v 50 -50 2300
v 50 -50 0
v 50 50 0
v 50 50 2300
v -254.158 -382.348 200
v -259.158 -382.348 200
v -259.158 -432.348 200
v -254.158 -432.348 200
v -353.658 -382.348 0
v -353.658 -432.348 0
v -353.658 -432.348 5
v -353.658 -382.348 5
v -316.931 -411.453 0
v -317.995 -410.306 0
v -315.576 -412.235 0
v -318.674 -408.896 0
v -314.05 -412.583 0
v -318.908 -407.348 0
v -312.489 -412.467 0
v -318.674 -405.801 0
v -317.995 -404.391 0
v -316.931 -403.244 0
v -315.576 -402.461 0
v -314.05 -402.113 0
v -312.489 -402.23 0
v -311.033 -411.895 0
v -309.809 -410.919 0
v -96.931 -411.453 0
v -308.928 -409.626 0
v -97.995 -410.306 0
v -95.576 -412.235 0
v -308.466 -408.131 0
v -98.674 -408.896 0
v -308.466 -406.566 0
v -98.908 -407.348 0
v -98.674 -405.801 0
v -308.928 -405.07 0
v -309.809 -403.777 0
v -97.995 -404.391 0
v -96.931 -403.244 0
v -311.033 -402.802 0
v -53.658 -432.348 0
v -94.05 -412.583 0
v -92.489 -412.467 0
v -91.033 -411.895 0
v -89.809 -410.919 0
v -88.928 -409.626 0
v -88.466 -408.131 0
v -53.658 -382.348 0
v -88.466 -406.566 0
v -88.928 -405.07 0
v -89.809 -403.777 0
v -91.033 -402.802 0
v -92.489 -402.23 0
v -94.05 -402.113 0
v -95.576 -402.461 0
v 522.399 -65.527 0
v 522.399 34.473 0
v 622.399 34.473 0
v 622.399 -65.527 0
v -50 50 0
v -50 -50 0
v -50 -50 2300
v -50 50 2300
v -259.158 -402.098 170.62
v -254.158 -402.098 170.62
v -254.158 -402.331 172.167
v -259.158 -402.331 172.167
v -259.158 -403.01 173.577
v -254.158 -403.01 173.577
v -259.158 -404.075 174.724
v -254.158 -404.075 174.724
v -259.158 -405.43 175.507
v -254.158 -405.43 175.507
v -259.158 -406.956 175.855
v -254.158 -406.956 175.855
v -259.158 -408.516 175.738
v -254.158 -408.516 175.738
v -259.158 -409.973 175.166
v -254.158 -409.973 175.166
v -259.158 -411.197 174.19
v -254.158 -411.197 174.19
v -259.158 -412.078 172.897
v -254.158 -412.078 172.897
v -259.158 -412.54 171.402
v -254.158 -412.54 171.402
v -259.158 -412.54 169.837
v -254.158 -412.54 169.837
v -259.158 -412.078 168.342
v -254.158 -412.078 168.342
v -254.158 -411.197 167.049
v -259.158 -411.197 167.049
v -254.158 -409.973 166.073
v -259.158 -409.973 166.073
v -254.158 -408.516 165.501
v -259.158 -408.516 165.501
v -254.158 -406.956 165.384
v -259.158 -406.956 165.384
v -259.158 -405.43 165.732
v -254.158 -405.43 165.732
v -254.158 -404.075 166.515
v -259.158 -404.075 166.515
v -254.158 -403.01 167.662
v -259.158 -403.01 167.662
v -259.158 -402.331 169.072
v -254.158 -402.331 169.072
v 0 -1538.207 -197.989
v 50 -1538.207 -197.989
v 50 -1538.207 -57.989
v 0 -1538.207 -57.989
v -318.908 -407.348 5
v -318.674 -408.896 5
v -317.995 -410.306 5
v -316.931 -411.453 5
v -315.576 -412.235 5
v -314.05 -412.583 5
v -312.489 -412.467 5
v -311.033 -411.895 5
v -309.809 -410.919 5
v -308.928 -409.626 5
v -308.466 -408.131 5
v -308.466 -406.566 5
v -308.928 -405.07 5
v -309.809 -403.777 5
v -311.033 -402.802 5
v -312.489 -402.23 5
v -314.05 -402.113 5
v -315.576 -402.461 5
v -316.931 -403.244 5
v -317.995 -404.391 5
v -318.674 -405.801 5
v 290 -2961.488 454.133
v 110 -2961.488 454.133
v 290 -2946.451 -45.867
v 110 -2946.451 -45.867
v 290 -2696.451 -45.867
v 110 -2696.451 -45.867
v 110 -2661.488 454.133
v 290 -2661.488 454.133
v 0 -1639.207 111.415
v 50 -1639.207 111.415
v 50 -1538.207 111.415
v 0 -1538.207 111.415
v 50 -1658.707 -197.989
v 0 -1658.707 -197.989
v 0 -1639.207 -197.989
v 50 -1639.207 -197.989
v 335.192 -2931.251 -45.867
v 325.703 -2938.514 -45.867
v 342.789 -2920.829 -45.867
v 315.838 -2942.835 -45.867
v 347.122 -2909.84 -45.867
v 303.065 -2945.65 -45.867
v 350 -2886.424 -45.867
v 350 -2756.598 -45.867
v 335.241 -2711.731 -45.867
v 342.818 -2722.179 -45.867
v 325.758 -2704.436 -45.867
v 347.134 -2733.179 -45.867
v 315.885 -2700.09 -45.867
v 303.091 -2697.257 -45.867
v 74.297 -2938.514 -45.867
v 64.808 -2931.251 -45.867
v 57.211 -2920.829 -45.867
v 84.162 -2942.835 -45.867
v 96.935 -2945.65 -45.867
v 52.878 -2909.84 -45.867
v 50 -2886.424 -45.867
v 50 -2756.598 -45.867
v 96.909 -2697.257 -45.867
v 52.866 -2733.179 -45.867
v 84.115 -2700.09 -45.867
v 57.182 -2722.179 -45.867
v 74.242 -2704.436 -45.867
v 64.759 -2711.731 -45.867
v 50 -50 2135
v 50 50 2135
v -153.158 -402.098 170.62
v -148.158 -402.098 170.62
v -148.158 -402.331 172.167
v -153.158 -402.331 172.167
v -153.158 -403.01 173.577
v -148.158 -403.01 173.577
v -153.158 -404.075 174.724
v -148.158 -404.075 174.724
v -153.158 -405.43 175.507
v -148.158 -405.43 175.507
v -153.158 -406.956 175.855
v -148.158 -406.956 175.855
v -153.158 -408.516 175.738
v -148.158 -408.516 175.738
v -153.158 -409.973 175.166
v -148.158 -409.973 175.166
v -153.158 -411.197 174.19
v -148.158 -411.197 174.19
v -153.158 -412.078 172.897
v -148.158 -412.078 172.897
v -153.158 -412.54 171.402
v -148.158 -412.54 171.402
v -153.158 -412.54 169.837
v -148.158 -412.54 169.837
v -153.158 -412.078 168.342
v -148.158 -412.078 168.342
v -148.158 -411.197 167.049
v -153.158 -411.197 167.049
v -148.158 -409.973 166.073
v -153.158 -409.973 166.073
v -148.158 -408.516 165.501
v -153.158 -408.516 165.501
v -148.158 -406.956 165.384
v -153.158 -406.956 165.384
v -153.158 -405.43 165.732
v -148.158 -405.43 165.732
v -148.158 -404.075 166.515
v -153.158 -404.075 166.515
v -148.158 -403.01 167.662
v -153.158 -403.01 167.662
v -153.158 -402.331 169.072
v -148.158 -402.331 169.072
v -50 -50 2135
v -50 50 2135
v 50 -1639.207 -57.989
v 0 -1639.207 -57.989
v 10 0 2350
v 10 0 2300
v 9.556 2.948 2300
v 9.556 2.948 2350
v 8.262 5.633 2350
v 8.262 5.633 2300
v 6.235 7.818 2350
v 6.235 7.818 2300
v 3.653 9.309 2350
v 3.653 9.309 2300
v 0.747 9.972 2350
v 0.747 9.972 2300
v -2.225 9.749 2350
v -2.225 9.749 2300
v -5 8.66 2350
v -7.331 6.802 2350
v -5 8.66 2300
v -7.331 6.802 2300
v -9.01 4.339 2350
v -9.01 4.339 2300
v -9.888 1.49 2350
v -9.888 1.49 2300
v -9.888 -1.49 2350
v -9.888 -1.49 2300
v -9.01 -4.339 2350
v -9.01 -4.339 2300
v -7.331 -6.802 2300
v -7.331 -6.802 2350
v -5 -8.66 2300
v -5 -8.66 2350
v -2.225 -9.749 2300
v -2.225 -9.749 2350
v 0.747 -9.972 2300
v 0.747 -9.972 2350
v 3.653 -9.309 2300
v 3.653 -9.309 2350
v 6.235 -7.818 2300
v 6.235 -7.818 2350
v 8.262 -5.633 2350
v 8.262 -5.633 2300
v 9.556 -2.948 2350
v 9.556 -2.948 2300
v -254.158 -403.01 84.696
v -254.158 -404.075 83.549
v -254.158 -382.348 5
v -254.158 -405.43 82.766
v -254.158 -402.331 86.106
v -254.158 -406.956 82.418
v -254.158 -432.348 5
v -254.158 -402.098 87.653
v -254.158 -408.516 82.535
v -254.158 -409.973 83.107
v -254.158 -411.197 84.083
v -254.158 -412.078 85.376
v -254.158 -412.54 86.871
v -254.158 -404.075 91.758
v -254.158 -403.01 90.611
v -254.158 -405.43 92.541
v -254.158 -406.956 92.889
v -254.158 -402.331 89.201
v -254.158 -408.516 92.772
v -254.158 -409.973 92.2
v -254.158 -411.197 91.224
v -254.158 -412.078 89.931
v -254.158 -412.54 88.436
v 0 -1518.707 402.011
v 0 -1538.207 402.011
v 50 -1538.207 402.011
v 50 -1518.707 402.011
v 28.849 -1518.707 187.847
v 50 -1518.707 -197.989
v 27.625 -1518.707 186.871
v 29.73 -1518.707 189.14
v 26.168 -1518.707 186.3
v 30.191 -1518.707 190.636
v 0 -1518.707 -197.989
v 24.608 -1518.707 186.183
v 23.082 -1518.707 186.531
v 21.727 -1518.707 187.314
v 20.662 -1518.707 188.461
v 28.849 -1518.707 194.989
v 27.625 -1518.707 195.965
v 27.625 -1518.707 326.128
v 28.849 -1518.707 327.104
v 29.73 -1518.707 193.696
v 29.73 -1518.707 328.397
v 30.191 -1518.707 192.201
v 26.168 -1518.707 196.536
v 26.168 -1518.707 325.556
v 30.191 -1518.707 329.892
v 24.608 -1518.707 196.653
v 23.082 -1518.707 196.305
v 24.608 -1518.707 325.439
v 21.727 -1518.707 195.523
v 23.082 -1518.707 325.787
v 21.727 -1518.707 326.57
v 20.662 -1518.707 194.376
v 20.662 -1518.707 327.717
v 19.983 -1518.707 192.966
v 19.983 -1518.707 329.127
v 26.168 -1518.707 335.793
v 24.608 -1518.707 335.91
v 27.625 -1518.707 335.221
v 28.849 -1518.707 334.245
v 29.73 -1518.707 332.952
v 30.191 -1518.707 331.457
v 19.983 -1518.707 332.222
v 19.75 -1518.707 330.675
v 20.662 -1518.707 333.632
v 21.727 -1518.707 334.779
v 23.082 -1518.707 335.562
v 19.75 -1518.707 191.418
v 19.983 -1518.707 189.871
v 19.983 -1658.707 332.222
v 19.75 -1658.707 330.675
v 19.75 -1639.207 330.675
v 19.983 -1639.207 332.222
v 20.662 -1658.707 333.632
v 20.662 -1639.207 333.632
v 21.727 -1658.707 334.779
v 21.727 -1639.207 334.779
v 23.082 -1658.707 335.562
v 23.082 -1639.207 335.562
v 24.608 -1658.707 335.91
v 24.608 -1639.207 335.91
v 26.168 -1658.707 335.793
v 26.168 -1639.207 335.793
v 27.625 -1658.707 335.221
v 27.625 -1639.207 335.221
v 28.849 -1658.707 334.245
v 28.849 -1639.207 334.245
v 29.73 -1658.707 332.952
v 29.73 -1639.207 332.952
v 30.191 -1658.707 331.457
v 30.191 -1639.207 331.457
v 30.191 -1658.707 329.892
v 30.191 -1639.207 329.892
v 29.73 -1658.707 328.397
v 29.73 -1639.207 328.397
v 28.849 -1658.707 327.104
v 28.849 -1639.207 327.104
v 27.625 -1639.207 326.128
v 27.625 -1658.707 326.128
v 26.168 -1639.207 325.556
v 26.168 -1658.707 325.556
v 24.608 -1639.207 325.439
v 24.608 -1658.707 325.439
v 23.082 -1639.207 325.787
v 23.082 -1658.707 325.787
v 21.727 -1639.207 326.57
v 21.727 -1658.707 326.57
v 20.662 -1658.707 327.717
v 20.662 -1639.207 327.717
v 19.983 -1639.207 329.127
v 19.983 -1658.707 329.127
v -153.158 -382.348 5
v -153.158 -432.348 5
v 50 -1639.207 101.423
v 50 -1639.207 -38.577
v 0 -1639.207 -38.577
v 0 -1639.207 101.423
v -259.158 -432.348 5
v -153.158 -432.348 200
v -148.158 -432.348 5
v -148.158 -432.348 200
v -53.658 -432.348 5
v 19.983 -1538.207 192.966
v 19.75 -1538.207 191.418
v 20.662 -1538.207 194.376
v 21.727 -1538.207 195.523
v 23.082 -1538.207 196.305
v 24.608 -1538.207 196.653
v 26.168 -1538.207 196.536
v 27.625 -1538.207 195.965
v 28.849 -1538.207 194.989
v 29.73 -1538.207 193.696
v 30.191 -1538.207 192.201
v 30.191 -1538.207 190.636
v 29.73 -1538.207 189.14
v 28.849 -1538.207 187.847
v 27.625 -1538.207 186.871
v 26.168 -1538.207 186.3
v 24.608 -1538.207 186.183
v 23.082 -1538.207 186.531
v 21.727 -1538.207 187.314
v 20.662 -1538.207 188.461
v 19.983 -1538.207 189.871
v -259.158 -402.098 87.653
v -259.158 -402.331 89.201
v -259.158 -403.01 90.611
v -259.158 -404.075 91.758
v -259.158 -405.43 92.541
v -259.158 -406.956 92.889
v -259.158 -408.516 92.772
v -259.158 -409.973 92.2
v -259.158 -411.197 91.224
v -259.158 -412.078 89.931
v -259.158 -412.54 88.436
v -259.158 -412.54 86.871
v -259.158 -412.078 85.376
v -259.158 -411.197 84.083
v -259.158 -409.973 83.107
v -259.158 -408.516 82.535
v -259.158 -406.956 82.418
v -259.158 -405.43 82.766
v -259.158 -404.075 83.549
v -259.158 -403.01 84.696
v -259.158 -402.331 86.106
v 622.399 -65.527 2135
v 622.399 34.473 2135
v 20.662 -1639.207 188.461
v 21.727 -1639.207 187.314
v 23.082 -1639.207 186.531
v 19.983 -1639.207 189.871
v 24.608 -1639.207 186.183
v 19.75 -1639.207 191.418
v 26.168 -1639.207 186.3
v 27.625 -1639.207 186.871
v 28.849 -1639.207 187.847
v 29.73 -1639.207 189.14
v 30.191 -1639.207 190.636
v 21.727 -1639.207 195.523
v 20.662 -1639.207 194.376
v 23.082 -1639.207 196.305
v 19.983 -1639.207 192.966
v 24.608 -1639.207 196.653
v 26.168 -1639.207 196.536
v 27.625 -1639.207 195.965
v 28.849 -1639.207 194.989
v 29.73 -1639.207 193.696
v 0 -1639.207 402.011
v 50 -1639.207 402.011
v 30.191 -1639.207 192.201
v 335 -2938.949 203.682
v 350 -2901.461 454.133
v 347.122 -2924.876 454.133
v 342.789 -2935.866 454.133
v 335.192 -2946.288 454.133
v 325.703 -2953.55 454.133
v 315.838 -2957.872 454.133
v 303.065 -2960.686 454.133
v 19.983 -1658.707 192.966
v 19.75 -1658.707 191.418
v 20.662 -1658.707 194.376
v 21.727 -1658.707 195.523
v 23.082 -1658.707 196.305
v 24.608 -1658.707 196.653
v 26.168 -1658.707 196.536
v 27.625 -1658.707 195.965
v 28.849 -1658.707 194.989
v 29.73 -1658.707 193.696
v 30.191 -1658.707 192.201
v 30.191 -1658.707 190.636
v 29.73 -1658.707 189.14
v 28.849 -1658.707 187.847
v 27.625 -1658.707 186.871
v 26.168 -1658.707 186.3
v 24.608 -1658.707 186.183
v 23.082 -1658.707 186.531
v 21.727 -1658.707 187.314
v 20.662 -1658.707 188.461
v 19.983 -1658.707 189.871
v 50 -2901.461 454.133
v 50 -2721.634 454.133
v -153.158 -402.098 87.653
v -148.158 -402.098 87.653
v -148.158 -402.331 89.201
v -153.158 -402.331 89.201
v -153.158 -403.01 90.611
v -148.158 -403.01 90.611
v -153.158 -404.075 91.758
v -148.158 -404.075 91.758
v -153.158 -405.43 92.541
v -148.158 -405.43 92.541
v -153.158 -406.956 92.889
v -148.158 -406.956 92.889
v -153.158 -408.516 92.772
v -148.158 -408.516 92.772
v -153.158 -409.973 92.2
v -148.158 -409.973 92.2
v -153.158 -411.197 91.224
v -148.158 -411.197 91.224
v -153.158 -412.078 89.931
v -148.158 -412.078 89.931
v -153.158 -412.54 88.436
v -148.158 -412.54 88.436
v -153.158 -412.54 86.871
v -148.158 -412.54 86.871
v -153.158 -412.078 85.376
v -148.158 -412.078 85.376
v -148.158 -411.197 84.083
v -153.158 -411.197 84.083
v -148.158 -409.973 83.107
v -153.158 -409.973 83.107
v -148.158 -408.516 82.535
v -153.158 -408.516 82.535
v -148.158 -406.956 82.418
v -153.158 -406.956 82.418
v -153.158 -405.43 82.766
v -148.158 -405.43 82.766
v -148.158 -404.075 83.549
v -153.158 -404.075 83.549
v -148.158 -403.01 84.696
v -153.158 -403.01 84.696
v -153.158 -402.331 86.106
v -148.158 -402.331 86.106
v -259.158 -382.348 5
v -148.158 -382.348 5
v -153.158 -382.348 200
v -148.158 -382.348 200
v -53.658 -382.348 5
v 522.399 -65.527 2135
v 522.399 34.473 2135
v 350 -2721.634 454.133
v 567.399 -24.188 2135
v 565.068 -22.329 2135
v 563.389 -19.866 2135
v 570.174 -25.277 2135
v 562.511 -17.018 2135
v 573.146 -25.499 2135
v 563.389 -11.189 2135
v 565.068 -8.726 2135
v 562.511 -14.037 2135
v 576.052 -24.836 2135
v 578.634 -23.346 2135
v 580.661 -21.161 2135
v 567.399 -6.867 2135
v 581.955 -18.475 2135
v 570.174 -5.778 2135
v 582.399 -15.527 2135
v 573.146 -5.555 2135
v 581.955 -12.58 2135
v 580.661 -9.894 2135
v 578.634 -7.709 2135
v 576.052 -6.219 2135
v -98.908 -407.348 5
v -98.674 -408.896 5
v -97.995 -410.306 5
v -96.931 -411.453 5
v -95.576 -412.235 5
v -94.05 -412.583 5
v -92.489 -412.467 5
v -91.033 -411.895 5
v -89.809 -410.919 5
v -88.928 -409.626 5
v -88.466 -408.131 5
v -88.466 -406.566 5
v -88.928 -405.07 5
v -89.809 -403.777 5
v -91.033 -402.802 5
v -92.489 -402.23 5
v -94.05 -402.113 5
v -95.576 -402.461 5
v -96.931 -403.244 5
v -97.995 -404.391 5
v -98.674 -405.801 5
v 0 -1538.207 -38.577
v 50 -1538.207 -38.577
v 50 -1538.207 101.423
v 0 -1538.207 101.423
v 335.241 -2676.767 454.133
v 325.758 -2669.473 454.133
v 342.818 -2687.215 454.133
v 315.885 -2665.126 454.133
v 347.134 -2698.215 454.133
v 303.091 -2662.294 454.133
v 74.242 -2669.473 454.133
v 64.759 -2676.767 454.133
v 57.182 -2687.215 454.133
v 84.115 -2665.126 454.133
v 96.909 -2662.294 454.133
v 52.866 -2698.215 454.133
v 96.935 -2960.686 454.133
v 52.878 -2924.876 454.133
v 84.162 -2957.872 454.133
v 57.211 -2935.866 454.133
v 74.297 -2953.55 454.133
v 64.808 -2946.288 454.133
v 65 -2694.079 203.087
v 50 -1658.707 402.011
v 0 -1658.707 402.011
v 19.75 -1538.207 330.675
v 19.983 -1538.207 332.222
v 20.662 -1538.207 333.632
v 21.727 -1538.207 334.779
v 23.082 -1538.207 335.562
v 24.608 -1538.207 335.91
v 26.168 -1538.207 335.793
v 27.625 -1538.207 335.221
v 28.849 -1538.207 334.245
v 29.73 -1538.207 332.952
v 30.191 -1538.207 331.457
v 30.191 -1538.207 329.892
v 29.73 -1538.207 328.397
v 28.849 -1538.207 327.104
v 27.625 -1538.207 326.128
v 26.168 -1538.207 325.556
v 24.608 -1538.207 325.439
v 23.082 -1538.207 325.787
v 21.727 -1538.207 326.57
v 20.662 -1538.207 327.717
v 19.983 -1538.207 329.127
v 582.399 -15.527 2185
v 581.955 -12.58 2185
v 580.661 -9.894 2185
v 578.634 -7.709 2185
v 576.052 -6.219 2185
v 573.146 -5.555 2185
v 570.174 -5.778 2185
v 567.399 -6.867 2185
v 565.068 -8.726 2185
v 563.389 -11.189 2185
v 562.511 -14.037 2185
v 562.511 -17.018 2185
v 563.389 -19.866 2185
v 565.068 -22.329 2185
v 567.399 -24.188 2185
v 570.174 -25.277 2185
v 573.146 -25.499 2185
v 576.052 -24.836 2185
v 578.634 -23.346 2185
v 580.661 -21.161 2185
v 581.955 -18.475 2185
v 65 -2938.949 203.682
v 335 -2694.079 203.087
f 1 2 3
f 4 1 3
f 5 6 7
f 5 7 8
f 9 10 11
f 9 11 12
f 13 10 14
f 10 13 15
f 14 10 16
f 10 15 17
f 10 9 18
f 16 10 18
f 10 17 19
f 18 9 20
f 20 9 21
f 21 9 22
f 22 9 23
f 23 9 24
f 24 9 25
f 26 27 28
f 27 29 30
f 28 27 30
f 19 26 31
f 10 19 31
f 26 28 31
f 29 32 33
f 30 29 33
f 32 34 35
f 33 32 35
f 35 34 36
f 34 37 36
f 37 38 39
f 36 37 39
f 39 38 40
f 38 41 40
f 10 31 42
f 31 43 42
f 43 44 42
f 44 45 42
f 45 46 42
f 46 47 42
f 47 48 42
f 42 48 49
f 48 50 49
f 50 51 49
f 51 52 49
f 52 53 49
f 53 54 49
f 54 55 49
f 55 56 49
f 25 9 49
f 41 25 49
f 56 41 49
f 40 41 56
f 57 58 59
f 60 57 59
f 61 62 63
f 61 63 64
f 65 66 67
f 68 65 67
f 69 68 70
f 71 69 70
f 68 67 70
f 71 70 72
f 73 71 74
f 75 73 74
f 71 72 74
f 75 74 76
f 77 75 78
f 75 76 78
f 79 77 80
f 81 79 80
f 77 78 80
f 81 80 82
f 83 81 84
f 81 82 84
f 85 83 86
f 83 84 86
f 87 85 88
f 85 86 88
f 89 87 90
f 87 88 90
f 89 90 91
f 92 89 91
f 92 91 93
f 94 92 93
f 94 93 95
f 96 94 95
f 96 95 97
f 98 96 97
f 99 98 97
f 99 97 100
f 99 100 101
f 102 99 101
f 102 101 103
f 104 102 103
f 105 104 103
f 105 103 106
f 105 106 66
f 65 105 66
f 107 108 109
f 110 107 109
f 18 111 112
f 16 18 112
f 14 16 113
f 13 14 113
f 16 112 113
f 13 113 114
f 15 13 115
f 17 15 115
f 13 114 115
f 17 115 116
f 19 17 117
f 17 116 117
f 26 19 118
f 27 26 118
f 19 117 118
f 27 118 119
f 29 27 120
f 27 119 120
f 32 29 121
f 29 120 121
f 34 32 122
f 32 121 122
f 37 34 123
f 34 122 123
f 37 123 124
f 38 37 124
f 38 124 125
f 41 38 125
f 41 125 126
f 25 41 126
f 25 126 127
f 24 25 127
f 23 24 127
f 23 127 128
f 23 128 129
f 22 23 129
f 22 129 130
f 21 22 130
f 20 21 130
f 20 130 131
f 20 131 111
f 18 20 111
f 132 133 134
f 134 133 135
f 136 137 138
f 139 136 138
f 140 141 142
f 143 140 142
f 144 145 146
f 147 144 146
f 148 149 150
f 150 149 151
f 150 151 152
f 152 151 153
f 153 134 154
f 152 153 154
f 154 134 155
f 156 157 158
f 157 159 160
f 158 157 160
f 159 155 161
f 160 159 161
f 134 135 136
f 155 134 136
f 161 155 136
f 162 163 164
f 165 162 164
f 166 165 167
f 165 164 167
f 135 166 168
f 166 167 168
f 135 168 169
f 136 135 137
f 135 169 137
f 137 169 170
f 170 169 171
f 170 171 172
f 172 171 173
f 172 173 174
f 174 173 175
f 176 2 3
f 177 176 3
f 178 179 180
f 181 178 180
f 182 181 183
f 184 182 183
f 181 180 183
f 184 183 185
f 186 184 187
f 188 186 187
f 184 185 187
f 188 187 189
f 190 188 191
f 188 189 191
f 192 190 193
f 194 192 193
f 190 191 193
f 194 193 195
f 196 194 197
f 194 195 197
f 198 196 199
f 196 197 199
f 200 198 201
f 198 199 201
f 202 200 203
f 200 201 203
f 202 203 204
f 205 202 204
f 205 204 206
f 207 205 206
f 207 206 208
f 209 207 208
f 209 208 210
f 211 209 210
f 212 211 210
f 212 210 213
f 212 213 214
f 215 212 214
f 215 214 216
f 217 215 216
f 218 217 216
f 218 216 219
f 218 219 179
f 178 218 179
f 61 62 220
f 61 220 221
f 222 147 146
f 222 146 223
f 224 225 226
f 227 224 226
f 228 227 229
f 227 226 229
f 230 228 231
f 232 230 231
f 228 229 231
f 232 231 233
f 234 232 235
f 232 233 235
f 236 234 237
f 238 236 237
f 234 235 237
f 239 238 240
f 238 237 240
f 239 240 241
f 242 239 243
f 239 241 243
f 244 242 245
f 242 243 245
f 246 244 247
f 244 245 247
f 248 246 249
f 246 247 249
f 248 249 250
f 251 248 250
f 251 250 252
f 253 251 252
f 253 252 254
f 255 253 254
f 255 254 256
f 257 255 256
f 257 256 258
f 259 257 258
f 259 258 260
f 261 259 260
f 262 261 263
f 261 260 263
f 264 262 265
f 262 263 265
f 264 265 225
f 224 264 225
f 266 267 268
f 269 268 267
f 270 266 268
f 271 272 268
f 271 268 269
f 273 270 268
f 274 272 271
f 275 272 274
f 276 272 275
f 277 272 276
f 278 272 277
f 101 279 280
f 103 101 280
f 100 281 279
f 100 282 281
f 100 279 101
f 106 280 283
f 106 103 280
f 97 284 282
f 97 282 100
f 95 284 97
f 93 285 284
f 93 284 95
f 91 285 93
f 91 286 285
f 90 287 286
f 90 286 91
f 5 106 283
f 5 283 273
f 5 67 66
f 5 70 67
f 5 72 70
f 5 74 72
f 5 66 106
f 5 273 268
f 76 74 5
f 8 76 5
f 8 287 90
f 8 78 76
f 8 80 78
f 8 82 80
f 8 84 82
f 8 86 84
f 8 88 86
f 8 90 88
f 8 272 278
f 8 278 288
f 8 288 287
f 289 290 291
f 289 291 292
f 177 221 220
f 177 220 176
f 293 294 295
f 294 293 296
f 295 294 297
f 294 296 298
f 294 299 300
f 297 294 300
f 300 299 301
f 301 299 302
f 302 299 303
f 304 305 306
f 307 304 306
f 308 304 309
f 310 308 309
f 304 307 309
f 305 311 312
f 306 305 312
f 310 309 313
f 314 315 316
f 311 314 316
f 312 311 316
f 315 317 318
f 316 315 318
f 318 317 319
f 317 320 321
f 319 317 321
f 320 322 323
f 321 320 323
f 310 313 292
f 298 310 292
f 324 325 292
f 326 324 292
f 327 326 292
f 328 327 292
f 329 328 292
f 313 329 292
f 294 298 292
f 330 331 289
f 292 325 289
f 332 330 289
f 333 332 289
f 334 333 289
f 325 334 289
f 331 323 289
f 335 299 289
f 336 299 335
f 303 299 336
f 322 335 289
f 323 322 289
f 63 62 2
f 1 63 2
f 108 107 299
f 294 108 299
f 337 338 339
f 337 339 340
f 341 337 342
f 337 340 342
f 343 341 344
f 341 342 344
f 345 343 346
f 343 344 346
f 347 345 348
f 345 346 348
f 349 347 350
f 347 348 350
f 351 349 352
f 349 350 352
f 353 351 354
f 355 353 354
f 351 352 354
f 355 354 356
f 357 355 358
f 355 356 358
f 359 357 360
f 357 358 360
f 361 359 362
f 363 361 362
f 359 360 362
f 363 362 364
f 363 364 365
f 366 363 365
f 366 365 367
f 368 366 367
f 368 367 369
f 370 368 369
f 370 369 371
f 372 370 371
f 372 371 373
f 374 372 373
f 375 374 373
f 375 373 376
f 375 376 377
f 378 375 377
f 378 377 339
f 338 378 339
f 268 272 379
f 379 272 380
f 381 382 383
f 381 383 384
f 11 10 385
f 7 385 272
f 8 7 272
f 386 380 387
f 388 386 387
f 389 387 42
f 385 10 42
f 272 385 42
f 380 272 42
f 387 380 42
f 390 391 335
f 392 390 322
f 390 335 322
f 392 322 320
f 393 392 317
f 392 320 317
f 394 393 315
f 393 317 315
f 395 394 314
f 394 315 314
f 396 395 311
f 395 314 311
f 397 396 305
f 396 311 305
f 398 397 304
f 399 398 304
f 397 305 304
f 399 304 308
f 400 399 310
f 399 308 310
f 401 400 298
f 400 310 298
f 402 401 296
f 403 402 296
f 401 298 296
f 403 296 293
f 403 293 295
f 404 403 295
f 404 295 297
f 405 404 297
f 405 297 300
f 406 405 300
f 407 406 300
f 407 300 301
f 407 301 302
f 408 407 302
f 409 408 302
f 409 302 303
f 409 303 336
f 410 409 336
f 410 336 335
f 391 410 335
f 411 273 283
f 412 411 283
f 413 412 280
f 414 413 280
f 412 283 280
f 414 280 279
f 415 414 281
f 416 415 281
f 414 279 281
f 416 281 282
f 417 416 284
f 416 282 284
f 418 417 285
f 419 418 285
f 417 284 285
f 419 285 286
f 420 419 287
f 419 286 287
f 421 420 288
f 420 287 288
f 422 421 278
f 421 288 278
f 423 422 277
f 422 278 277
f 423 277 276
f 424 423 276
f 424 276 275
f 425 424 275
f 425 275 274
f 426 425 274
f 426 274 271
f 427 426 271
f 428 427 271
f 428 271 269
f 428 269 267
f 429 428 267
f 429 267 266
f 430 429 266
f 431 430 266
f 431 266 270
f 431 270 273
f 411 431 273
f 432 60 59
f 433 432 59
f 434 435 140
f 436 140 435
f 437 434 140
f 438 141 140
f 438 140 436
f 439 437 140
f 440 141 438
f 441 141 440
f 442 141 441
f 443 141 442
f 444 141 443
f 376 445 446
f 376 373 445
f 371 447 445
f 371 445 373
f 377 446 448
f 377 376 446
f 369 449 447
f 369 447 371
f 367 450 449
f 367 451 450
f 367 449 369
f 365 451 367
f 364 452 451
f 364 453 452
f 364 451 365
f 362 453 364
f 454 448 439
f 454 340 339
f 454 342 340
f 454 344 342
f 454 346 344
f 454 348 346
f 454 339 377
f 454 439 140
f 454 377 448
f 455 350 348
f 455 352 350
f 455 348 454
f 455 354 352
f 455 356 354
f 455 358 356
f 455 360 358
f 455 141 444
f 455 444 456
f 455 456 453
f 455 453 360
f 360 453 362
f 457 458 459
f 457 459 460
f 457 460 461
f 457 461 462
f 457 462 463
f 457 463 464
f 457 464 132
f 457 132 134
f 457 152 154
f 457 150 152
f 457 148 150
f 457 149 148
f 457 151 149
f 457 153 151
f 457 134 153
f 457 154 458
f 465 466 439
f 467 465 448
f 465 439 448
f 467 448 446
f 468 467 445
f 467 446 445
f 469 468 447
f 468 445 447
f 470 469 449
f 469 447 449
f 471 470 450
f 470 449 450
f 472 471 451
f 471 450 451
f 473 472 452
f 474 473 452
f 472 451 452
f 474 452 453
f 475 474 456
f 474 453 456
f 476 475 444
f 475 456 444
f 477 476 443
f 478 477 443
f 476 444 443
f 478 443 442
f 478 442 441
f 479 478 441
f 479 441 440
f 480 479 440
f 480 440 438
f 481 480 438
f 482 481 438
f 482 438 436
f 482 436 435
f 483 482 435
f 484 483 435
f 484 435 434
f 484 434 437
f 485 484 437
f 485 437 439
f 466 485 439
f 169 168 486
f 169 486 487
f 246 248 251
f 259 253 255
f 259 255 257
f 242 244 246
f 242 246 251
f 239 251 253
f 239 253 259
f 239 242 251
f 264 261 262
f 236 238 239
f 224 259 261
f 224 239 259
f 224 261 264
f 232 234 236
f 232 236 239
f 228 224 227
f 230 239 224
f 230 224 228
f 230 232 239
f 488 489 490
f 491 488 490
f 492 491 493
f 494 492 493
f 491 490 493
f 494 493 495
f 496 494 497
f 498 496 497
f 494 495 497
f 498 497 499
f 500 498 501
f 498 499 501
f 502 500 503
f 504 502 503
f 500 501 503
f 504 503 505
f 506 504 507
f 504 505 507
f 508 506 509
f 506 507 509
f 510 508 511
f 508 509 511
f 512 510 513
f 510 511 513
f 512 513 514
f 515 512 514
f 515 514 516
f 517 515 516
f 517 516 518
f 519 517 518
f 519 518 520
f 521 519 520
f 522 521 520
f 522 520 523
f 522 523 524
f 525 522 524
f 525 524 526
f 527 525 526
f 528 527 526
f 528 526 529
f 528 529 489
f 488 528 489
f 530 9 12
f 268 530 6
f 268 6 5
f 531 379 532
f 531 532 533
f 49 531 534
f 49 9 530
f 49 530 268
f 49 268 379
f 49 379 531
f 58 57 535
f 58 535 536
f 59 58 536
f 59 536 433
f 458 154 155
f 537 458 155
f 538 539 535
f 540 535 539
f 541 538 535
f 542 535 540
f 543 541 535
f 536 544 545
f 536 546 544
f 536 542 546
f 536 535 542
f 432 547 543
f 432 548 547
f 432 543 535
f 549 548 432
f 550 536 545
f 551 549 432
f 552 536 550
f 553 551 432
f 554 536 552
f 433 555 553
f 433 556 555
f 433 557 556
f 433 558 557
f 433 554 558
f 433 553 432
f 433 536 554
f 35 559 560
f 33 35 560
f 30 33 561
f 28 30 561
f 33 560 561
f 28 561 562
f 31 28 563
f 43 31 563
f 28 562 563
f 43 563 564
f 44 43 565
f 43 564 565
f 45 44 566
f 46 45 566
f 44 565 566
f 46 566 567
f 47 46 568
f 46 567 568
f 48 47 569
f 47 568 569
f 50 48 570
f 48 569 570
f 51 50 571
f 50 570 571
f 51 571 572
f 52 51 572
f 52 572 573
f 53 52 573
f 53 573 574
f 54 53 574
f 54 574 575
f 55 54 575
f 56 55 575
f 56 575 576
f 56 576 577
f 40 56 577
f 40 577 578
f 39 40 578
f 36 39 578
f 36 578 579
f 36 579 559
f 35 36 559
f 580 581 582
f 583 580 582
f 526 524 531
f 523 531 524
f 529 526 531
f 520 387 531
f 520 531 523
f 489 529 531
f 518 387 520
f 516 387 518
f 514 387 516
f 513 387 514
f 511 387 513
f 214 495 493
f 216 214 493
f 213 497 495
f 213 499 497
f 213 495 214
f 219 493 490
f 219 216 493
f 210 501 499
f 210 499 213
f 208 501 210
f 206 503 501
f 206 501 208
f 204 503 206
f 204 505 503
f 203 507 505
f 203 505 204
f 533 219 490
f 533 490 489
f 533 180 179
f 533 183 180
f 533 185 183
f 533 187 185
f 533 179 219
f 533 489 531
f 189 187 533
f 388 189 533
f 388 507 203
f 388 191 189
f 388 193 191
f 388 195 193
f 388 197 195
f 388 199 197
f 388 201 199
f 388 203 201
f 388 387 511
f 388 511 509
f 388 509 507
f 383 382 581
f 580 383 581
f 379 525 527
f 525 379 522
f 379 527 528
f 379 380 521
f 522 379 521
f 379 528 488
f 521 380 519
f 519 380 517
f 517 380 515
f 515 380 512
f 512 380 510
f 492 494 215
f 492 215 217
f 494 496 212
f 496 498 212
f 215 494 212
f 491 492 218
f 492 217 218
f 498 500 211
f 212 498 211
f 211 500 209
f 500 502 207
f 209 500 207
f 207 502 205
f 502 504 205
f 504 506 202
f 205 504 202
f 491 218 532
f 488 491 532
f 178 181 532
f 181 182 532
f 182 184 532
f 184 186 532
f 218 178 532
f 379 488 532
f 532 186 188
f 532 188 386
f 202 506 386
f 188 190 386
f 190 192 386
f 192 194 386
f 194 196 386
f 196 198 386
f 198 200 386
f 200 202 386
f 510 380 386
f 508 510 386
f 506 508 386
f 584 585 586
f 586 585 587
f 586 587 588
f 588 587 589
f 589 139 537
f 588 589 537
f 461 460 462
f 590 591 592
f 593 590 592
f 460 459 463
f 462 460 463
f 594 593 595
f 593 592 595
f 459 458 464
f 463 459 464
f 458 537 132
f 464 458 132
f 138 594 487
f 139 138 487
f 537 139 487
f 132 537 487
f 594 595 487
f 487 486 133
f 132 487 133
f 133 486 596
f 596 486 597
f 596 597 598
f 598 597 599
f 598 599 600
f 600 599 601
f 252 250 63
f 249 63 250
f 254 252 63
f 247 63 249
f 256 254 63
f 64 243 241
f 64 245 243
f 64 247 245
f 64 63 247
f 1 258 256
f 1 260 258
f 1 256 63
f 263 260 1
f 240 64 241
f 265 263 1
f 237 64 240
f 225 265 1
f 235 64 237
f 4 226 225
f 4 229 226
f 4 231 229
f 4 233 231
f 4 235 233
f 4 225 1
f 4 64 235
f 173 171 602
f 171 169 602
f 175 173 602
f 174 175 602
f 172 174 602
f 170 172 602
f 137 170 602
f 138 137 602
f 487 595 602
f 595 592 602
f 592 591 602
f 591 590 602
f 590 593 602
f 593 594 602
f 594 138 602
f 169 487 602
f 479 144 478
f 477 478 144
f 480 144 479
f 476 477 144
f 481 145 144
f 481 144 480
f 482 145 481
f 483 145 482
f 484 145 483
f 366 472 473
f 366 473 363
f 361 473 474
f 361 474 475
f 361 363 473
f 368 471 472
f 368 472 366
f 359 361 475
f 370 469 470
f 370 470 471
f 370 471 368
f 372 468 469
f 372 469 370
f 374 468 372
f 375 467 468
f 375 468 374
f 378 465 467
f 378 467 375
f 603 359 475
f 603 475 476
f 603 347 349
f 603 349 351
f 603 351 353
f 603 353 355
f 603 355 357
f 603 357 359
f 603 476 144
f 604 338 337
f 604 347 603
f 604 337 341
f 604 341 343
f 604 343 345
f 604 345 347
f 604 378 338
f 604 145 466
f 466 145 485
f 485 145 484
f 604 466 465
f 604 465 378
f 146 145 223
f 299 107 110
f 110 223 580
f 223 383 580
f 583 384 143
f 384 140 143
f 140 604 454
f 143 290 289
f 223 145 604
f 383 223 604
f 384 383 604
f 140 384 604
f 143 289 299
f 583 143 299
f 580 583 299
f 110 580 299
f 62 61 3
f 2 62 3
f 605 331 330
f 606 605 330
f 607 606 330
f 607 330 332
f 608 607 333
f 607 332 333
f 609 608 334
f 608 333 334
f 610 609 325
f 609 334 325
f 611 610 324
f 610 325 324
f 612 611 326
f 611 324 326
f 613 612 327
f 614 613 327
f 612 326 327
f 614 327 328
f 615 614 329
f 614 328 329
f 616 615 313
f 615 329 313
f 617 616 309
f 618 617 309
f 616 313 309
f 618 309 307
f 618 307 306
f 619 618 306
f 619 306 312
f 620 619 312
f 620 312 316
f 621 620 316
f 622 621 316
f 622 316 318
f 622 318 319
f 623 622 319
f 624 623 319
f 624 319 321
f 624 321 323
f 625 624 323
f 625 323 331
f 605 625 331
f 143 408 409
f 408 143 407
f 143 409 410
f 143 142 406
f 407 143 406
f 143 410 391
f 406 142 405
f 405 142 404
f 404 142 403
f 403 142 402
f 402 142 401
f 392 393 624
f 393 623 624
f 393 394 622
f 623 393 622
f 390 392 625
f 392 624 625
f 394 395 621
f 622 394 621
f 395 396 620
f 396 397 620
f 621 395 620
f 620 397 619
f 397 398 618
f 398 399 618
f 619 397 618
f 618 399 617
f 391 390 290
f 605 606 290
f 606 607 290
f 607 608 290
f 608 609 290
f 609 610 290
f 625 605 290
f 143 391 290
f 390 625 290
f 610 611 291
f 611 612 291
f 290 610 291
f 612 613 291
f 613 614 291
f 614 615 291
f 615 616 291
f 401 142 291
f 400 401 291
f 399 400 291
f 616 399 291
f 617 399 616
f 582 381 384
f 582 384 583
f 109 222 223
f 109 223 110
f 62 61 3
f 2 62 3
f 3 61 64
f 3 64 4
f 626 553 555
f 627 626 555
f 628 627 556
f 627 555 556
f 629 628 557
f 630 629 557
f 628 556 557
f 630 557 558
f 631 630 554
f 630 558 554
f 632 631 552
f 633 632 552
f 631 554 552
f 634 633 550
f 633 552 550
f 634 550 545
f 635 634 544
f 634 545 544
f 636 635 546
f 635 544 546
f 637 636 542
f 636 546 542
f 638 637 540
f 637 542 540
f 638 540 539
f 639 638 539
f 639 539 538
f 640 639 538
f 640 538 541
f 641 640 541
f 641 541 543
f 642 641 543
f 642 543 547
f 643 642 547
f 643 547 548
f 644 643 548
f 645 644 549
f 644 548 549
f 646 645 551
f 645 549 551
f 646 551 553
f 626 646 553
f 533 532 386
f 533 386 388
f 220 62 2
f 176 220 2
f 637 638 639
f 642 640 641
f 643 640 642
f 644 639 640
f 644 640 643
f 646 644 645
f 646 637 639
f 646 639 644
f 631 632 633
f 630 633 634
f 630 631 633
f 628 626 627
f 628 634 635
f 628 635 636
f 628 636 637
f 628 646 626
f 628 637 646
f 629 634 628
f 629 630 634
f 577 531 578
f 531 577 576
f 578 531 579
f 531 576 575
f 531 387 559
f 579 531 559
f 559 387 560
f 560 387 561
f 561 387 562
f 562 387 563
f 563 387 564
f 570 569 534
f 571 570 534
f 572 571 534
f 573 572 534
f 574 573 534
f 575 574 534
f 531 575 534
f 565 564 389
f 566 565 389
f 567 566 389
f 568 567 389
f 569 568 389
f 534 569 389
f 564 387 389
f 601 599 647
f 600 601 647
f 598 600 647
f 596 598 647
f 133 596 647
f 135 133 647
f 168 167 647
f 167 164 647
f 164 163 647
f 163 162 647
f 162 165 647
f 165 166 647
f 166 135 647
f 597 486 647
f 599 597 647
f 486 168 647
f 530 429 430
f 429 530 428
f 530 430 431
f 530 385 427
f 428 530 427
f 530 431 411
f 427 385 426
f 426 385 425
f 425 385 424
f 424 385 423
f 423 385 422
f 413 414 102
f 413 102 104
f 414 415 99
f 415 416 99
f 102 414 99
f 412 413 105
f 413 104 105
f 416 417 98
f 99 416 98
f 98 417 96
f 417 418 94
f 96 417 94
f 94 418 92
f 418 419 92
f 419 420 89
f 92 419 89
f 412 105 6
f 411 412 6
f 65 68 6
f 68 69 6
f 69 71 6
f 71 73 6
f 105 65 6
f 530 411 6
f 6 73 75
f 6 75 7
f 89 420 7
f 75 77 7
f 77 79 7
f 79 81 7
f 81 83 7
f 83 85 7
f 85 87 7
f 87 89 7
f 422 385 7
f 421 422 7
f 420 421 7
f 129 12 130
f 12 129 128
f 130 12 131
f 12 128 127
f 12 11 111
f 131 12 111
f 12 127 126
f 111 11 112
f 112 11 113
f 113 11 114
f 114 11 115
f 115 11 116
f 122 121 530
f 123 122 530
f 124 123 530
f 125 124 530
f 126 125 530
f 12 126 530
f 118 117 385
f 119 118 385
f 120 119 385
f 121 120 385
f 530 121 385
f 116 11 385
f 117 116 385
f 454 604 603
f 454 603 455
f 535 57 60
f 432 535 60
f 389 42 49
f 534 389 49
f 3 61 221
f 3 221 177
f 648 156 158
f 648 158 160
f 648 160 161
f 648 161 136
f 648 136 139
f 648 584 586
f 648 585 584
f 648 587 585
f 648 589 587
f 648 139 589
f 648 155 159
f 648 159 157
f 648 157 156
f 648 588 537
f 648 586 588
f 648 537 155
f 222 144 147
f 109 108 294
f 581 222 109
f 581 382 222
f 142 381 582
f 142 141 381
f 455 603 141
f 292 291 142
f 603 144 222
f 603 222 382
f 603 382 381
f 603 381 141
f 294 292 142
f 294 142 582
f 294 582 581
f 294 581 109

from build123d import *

# Parameters (mm, degrees)
F0_W         = 100
F0_H         = 100
F1_DEPTH     = 2300
F2_DEPTH     = 2135
F3_R         = 10
F4_DEPTH     = 50
F5_R         = 10
F6_DEPTH     = 50
F7_W         = 140
F7_H         = 600
F8_DEPTH     = 50
F9_W         = 101
F9_H         = 290.5959367752
F9_H_2       = 140
F10_DEPTH    = 100.001
F11_DEPTH    = 300
F12_T1_DEPTH = 800.2260480622
F12_T3_DEPTH = 801.2209490406
F14_W        = 300
F14_H        = 50
F15_DEPTH    = 200
F16_W        = 94.5
F16_H        = 195
F16_W_2      = 101
F17_DEPTH    = 482.3491559753
F19_D        = 10.5
F20_D        = 10.5
F21_D        = 10.5


# Not quite as in the source:
# - a fillet or chamfer that OpenCascade refuses, or shapes differently, is made with other operations: its cross-section is extruded or revolved along the edge and cut away or added


with BuildPart() as f1:
    # F0 (on Top) → F1 (new body)
    with BuildSketch(Plane.XY):
        Rectangle(F0_W, F0_H)
    extrude(amount=F1_DEPTH)

    # F3 (on face) → F4 (join)
    with BuildSketch(Plane.XY.offset(2300)):
        Circle(F3_R)
    extrude(amount=F4_DEPTH)


with BuildPart() as f2:
    # F0 (on Top) → F2 (new body)
    with BuildSketch(Plane.XY):
        Rectangle(F0_W, F0_H)
    extrude(amount=F2_DEPTH)


with BuildPart() as f2b:
    # F0 (on Top) → F2, piece 2 (new body)
    with BuildSketch(Plane.XY):
        with Locations((572.3989486694, -15.5273422599)):
            Rectangle(F0_W, F0_H)
    extrude(amount=F2_DEPTH)

    # F5 (on face) → F6 (join)
    with BuildSketch(Plane.XY.offset(2135)):
        with Locations((572.3989486694, -15.5273422599)):
            Circle(F5_R)
    extrude(amount=F6_DEPTH)


with BuildPart() as f8:
    # F7 (on Right) → F8 (new body)
    with BuildSketch(Plane.YZ):
        with Locations((-1588.707132116, 102.0108014345)):
            Rectangle(F7_W, F7_H)
    extrude(amount=F8_DEPTH)

    # F9 (on face) → F10 (cut, through all)
    with BuildSketch(Plane.YZ.offset(50)):
        with Locations((-1588.707132116, 256.7128330469)):
            Rectangle(F9_W, F9_H)
        with Locations((-1588.707132116, 31.4230661094)):
            Rectangle(F9_W, F9_H_2)
        with Locations((-1588.707132116, -127.9891985655)):
            Rectangle(F9_W, F9_H_2)
    extrude(amount=-F10_DEPTH, mode=Mode.SUBTRACT)

    # F19 (through all)
    with Locations(Plane.XZ.offset(1658.707132116)):
        with Locations((25, 330.6745588779), (25, 191.4181262255)):
            Hole(F19_D / 2)


with BuildPart() as f11:
    # F9 (on face) → F11 (new body)
    with BuildSketch(Plane.YZ.offset(50)):
        Polygon((-2661.4876322974, 454.1331665205), (-2961.4876322974, 454.1331665205), (-2946.4510382692, -45.8668334795), (-2696.4510382692, -45.8668334795), align=None)
    extrude(amount=F11_DEPTH)

    # F12: fillet of radius 60 on 4 edges, made by hand

    # F12_s2 → F12_t1 (cut)
    with BuildSketch(Plane(origin=(0, -20.8297708127, 692.6359378174), x_dir=(1, 0, 0), z_dir=(0, 0.0300595982, -0.9995481082))):
        with BuildLine():
            add(Edge.make_bspline(
                [(290, 2946.4982997158), (350, 2946.4982997158), (350, 2886.4982997158)],
                knots=[0, 0, 0, 1, 1, 1], degree=2, weights=[1, 1, 1]))
            Line((350, 2886.4982997158), (350, 2946.4982997158))
            Line((350, 2946.4982997158), (290, 2946.4982997158))
        make_face()
        with BuildLine():
            add(Edge.make_bspline(
                [(110, 2946.4982997158), (50, 2946.4982997158), (50, 2886.4982997158)],
                knots=[0, 0, 0, 1, 1, 1], degree=2, weights=[1, 1, 1]))
            Line((50, 2886.4982997158), (50, 2946.4982997158))
            Line((50, 2946.4982997158), (110, 2946.4982997158))
        make_face()
    extrude(amount=F12_T1_DEPTH, mode=Mode.SUBTRACT)

    # F12_s4 → F12_t3 (cut)
    with BuildSketch(Plane(origin=(0, -26.776023858, -382.9149808747), x_dir=(1, 0, 0), z_dir=(0, 0.0697564737, 0.9975640503))):
        with BuildLine():
            add(Edge.make_bspline(
                [(110, -2686.6831104978), (50, -2686.6831104978), (50, -2746.6831104978)],
                knots=[0, 0, 0, 1, 1, 1], degree=2, weights=[1, 1, 1]))
            Line((50, -2746.6831104978), (50, -2686.6831104978))
            Line((50, -2686.6831104978), (110, -2686.6831104978))
        make_face()
        with BuildLine():
            add(Edge.make_bspline(
                [(290, -2686.6831104978), (350, -2686.6831104978), (350, -2746.6831104978)],
                knots=[0, 0, 0, 1, 1, 1], degree=2, weights=[1, 1, 1]))
            Line((350, -2746.6831104978), (350, -2686.6831104978))
            Line((350, -2686.6831104978), (290, -2686.6831104978))
        make_face()
    extrude(amount=F12_T3_DEPTH, mode=Mode.SUBTRACT)


with BuildPart() as f15:
    # F14 (on Top) → F15 (new body)
    with BuildSketch(Plane.XY):
        with Locations((-203.6576080547, -407.3481559753)):
            Rectangle(F14_W, F14_H)
    extrude(amount=F15_DEPTH)

    # F16 (on face) → F17 (cut, through all)
    with BuildSketch(Plane.XZ.offset(432.3481559753)):
        with Locations((-306.4076080547, 102.5)):
            Rectangle(F16_W, F16_H)
        with Locations((-203.6576080547, 102.5)):
            Rectangle(F16_W_2, F16_H)
        with Locations((-100.9076080547, 102.5)):
            Rectangle(F16_W, F16_H)
    extrude(amount=-F17_DEPTH, mode=Mode.SUBTRACT)

    # F20 (through all)
    with Locations(Plane(origin=(0, 0, 0), x_dir=(1, 0, 0), z_dir=(0, 0, -1))):
        with Locations((-313.6576080547, 407.3481559753), (-93.6576080547, 407.3481559753)):
            Hole(F20_D / 2)

    # F21 (through all)
    with Locations(Plane(origin=(-259.1576080547, 0, 0), x_dir=(0, -1, 0), z_dir=(-1, 0, 0))):
        with Locations((407.3481559753, 170.6195473671), (407.3481559753, 87.6534283161)):
            Hole(F21_D / 2)


solid = Compound([f1.part, f2.part, f2b.part, f8.part, f11.part, f15.part])
